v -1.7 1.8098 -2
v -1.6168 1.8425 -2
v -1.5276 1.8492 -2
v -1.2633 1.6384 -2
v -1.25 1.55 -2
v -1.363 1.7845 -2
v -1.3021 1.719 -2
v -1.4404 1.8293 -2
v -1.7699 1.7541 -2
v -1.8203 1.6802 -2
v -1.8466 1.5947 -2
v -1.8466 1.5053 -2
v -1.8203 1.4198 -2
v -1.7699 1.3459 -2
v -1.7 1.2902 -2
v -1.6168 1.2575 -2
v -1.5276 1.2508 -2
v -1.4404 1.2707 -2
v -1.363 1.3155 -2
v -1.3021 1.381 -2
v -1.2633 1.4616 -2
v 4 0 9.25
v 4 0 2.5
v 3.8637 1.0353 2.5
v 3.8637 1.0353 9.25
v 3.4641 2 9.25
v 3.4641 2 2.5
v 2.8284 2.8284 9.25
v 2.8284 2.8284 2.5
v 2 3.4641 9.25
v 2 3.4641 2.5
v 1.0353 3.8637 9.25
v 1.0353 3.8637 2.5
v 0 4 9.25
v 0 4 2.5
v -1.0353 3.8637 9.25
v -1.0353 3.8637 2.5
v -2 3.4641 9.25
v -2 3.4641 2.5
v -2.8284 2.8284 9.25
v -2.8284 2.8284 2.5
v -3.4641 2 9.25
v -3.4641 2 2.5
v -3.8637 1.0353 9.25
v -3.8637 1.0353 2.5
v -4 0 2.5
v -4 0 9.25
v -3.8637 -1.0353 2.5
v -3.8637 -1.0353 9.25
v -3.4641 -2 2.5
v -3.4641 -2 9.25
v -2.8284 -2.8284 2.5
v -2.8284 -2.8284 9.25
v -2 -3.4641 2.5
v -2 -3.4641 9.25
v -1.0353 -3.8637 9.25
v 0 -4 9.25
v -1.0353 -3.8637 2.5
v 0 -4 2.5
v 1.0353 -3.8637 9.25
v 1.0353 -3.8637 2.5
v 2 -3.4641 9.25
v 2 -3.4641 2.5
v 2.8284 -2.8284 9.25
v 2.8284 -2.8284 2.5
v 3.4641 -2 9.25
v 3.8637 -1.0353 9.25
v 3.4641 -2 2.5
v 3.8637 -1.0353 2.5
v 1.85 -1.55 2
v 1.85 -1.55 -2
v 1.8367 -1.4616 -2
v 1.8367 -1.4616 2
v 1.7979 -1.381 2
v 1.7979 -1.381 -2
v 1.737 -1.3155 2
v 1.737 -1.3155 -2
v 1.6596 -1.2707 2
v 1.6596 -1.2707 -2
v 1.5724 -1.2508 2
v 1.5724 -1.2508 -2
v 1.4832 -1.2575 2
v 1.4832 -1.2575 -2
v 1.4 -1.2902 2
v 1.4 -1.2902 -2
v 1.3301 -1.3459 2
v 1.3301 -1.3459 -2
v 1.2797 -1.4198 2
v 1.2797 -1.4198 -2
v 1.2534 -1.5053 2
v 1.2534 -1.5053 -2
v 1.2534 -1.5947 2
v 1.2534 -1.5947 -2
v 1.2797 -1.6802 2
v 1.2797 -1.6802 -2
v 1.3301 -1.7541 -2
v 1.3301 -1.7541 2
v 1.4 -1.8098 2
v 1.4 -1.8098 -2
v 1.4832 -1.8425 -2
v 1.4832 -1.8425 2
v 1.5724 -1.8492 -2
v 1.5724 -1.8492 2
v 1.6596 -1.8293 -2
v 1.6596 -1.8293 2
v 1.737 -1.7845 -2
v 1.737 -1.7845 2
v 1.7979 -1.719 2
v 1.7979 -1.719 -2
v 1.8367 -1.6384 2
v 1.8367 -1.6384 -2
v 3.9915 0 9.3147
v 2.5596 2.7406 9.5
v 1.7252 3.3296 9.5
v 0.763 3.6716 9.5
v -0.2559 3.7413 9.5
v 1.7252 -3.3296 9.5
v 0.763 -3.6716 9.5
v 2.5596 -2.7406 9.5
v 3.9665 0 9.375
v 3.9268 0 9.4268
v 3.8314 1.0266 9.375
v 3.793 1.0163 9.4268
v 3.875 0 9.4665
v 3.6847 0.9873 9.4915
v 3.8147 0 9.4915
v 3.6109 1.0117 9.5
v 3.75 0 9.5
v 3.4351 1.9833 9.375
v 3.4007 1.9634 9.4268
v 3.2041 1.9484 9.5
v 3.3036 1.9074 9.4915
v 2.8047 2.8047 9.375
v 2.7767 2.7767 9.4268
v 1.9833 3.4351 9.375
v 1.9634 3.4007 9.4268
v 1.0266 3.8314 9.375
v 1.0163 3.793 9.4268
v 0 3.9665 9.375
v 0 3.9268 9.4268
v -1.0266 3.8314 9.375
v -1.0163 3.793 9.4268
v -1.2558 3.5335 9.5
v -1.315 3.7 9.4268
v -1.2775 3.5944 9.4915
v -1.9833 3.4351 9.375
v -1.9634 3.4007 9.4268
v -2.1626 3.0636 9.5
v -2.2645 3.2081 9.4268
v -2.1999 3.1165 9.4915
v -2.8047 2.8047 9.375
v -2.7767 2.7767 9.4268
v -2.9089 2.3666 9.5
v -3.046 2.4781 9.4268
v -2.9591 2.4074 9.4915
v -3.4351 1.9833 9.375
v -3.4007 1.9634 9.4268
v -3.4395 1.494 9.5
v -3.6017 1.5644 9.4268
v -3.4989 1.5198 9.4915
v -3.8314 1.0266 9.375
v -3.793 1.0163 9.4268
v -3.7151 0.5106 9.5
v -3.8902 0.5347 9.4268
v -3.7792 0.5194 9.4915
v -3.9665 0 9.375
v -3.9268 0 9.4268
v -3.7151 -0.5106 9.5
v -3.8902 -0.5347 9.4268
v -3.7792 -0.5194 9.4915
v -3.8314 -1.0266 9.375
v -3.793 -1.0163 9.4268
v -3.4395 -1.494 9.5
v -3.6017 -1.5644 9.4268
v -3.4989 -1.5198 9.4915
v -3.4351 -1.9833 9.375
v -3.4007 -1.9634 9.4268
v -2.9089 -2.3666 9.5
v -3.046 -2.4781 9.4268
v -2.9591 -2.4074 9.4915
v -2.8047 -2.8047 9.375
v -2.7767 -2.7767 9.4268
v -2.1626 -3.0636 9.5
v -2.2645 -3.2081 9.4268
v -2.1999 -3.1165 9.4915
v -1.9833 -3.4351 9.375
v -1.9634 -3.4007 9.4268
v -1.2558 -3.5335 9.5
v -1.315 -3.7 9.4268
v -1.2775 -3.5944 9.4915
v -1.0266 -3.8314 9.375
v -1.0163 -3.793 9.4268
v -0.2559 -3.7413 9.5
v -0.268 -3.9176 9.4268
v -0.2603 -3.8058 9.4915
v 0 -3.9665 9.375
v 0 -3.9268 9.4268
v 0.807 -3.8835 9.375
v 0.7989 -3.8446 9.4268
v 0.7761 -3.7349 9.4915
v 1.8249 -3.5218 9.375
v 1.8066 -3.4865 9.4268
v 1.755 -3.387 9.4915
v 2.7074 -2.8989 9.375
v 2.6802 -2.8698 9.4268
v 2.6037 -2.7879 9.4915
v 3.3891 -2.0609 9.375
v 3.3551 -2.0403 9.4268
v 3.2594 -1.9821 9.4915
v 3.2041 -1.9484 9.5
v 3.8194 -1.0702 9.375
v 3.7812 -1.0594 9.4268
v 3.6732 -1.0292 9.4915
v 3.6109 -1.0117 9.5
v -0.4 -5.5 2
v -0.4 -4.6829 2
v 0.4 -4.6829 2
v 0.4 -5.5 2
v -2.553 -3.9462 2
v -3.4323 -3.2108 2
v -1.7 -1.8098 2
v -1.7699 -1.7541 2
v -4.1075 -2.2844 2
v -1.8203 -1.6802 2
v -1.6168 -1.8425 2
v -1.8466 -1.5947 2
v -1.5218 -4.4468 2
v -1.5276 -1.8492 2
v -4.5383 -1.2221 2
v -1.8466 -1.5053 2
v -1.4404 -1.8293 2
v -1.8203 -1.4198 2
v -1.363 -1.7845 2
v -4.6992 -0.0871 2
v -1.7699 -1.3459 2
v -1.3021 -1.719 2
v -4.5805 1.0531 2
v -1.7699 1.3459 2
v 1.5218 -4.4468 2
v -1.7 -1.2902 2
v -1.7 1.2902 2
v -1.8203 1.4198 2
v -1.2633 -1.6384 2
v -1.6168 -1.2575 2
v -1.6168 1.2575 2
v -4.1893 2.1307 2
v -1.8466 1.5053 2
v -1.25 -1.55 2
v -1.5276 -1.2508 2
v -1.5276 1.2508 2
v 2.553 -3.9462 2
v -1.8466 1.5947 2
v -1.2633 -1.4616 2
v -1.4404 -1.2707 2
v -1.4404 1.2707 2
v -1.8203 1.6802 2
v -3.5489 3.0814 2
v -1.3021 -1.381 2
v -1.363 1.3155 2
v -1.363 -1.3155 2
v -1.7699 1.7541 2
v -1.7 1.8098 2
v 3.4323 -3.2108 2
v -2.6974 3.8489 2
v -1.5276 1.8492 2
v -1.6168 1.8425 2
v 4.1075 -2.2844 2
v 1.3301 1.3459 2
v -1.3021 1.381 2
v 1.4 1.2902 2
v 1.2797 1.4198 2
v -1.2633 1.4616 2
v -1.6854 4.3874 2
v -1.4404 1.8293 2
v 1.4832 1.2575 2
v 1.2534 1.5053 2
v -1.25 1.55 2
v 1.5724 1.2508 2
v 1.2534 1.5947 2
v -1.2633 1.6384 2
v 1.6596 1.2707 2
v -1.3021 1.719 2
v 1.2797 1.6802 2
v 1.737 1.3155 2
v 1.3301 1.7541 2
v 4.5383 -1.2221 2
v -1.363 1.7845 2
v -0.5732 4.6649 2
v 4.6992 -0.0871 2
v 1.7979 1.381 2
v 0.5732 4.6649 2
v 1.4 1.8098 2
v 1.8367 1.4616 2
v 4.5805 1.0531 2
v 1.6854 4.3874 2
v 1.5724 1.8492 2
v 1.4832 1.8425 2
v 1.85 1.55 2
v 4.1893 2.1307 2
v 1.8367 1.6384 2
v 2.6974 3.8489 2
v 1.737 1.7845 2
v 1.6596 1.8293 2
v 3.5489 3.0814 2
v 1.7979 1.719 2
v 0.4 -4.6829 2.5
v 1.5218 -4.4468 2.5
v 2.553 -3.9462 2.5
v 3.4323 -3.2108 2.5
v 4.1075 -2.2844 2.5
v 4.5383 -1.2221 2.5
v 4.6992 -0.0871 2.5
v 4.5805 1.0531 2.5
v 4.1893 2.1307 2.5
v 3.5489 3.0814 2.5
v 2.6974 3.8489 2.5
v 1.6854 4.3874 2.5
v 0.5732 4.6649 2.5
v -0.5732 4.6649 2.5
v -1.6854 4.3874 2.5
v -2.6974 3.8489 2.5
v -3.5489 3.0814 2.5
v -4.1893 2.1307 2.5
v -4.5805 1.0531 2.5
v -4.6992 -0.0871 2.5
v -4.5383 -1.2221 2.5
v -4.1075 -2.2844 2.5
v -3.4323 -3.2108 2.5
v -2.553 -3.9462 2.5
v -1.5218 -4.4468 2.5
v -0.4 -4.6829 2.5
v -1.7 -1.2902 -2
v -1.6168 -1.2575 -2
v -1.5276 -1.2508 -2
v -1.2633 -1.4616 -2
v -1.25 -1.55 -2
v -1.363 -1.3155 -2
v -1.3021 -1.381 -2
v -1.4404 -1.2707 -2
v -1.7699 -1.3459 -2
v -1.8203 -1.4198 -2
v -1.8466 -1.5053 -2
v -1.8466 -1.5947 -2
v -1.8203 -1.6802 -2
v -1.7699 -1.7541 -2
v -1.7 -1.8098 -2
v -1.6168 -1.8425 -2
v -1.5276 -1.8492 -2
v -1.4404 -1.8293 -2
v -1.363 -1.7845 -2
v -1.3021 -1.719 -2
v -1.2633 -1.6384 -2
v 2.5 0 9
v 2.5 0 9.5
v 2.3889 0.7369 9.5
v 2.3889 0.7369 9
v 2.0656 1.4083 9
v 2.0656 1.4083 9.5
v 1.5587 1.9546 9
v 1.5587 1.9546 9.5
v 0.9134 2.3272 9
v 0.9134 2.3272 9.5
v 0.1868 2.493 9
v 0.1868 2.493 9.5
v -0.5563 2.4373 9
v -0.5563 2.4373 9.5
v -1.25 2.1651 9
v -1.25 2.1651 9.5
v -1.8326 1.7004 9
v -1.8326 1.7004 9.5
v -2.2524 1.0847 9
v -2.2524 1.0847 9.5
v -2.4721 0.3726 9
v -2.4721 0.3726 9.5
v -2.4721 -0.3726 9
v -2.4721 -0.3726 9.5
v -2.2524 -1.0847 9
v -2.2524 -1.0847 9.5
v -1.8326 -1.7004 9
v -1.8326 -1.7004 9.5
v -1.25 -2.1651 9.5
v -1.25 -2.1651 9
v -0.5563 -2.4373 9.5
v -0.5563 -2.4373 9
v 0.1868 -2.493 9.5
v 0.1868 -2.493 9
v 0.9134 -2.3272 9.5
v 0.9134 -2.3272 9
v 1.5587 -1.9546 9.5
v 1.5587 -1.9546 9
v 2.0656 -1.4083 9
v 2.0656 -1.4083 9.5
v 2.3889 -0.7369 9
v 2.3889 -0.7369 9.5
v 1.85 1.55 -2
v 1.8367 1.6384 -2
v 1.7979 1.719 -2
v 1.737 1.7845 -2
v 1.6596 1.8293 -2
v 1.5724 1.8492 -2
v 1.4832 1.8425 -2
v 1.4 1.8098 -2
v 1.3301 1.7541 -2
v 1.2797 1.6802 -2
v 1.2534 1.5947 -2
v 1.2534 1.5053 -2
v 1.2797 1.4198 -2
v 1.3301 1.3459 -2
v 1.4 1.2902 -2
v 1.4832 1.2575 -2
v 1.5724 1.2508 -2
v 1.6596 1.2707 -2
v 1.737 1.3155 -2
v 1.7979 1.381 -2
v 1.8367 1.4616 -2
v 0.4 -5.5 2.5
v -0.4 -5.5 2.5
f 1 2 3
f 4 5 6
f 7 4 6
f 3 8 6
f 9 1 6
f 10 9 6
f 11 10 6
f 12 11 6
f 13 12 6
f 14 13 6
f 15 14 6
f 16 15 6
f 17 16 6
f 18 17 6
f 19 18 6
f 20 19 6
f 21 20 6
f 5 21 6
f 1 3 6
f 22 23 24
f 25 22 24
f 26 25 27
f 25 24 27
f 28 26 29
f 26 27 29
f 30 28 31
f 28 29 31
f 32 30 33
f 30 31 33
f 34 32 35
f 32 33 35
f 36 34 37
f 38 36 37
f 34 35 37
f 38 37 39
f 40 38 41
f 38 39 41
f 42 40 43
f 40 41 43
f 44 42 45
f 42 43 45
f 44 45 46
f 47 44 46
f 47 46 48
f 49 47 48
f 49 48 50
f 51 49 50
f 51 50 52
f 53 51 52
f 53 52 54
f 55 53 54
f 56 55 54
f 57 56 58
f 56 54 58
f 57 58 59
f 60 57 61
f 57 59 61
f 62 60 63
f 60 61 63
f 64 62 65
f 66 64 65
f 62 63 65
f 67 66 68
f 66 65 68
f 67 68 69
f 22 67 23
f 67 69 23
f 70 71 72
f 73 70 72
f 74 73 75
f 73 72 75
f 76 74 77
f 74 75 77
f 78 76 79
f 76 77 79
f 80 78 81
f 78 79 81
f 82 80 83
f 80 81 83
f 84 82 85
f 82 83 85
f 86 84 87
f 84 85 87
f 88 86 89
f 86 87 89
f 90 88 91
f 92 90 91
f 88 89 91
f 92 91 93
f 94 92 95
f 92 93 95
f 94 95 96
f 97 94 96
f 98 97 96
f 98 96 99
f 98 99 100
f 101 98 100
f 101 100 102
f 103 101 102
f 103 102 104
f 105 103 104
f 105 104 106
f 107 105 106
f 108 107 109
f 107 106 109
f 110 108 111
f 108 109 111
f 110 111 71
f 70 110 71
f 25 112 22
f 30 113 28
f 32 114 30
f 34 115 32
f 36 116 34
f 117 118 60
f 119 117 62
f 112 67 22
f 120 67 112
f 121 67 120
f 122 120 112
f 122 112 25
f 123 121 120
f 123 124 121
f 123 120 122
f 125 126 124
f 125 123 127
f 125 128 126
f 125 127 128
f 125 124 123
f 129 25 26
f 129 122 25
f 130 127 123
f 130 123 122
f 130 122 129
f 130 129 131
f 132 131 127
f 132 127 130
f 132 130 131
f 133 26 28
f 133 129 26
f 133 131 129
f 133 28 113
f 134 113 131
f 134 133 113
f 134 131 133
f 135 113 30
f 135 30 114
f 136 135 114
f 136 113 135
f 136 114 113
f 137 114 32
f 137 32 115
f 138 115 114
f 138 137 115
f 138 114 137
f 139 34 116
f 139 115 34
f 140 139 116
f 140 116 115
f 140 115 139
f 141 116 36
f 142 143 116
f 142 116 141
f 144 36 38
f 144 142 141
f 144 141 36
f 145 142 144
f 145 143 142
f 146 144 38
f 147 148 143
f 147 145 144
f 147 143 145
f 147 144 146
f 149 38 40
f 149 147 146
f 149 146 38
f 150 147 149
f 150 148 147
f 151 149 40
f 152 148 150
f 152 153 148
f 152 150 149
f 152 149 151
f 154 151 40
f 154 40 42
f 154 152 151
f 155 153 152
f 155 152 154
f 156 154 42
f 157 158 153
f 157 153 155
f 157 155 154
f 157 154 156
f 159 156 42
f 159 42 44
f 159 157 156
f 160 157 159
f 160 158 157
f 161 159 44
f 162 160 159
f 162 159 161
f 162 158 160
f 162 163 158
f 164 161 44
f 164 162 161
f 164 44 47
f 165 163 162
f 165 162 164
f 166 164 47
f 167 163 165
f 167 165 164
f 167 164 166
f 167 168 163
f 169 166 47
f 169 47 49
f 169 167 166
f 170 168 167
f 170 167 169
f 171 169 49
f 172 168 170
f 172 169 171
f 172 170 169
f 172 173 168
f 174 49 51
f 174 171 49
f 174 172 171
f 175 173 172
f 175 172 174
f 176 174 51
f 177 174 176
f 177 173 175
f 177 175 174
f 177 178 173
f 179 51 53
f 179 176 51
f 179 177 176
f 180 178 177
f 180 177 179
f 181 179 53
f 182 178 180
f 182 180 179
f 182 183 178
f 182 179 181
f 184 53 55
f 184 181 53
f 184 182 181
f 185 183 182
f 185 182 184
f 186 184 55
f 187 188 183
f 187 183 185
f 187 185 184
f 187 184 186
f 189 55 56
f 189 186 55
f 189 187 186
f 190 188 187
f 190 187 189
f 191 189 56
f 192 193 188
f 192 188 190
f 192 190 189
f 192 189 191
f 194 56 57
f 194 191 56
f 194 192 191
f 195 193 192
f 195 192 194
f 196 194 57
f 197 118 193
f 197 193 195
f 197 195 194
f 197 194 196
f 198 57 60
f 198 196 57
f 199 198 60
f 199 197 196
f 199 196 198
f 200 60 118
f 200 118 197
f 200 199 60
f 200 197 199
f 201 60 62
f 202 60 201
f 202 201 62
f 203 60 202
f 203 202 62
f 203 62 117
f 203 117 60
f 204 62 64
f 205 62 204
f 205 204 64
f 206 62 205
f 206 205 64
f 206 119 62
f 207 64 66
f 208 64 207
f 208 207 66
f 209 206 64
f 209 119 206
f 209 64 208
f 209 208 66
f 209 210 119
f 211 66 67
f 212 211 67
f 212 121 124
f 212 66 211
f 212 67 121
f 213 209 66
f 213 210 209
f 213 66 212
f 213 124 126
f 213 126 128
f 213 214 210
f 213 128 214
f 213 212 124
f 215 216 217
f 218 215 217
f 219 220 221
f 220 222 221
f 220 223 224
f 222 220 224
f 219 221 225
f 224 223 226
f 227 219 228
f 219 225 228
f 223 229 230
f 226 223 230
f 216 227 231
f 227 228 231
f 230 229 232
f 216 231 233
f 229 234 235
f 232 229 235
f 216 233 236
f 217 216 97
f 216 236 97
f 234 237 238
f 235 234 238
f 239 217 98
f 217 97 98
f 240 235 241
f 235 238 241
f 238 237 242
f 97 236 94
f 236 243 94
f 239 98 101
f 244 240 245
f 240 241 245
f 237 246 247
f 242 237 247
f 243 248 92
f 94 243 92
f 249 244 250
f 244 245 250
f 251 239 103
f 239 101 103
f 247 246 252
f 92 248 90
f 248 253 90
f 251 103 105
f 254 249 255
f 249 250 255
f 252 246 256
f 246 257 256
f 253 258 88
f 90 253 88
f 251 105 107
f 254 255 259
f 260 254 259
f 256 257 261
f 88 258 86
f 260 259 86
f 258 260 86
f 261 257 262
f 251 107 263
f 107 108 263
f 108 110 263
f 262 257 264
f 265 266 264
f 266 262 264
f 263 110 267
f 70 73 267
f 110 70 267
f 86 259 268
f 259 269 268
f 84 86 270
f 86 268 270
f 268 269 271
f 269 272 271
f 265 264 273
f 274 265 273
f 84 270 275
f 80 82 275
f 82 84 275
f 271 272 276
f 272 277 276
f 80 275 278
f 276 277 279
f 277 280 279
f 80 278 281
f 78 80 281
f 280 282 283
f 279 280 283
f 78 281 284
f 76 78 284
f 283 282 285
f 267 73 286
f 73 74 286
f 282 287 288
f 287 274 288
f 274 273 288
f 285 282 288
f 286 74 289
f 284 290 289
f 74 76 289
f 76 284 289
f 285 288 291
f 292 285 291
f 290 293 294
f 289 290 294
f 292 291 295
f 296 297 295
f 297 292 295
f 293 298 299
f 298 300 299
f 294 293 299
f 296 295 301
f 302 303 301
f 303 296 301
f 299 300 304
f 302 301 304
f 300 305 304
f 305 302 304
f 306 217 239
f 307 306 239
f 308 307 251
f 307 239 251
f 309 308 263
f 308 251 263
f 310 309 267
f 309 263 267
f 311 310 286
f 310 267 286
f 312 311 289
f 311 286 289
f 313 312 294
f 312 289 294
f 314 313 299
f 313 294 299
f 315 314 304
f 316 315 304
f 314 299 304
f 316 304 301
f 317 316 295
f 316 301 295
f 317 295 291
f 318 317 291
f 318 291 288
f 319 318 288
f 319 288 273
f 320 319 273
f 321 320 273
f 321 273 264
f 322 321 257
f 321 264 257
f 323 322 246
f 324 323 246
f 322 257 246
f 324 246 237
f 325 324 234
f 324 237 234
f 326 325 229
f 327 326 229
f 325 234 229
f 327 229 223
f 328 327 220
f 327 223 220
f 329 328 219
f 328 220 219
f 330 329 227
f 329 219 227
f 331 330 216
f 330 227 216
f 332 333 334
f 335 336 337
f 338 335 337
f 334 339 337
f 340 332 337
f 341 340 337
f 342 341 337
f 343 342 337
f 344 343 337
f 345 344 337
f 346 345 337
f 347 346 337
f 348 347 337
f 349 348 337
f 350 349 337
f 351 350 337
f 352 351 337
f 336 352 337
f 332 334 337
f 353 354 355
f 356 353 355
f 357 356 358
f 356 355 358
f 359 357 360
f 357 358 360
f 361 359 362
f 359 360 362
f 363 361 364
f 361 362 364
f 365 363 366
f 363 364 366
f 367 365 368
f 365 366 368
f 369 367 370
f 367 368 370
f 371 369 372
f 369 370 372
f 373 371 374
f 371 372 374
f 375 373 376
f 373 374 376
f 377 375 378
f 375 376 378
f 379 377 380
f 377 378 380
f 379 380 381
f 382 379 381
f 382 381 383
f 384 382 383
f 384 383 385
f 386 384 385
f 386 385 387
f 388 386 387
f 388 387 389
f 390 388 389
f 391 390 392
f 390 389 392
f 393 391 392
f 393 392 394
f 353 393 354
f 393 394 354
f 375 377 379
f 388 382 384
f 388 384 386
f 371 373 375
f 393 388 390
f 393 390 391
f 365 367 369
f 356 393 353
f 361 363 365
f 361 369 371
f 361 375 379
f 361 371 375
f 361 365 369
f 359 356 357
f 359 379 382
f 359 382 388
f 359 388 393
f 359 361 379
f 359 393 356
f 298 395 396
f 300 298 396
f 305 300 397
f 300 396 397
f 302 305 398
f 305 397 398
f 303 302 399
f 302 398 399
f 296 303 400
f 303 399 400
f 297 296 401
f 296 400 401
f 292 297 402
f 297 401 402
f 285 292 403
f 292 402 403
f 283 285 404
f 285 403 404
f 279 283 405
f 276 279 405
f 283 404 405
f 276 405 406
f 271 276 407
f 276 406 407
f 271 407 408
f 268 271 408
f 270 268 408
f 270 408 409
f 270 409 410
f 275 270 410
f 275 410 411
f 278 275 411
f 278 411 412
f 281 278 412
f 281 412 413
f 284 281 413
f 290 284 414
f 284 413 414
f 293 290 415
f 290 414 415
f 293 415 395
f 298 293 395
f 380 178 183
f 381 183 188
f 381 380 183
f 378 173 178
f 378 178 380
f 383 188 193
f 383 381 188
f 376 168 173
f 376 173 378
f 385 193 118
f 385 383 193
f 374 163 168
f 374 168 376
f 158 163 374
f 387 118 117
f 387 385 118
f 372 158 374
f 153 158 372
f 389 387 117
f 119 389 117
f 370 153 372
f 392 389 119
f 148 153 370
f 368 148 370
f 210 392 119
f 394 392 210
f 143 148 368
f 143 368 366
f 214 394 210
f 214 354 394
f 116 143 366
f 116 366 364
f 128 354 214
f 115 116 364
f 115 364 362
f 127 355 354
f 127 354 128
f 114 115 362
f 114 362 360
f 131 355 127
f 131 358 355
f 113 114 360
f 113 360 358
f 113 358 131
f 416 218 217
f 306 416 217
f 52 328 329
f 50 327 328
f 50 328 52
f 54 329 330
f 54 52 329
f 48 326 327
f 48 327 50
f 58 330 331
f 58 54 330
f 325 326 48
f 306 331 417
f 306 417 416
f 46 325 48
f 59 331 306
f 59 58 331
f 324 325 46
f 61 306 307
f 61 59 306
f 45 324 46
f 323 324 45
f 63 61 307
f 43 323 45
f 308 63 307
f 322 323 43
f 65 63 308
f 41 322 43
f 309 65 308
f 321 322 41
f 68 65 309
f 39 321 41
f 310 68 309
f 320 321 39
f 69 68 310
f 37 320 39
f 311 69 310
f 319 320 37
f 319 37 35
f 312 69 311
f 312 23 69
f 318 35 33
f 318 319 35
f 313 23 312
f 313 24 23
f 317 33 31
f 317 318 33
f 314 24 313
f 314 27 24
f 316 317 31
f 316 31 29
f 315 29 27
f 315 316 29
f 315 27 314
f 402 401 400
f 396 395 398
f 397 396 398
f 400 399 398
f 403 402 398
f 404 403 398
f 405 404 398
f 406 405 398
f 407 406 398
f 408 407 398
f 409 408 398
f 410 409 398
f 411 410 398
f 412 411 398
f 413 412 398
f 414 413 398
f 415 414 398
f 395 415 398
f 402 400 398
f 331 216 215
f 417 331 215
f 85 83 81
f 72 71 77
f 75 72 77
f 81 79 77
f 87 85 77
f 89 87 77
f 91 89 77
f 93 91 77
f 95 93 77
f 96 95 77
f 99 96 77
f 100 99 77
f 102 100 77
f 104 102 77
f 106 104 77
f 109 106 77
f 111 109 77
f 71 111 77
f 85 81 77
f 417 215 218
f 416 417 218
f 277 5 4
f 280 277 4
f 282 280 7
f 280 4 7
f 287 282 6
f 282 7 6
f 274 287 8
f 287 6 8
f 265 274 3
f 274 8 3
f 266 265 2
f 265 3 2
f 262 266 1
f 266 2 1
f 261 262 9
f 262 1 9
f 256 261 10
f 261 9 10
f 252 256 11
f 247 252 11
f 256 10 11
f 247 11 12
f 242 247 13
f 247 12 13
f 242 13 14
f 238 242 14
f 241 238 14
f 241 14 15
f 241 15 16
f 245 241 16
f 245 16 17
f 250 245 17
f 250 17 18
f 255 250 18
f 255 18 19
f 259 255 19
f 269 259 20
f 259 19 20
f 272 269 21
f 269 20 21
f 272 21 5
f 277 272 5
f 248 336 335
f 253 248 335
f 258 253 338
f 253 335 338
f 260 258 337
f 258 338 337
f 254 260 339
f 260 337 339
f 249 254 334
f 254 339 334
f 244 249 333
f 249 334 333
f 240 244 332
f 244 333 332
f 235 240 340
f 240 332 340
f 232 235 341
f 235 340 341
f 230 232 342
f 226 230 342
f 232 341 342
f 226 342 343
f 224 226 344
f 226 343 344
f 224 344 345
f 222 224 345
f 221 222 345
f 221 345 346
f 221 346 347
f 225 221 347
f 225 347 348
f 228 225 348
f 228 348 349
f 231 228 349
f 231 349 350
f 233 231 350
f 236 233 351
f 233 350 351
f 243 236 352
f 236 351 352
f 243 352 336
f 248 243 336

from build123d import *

# Parameters (mm, degrees)
BOSS_EXTRUDE1_DEPTH        = 2
BOSS_EXTRUDE1_DEPTH_BACK   = 2
SKETCH1_R                  = 0.3
BOSS_EXTRUDE1_2_DEPTH      = 2
BOSS_EXTRUDE1_2_DEPTH_BACK = 2
BOSS_EXTRUDE1_3_DEPTH      = 2
BOSS_EXTRUDE1_3_DEPTH_BACK = 2
BOSS_EXTRUDE1_4_DEPTH      = 2
BOSS_EXTRUDE1_4_DEPTH_BACK = 2
BOSS_EXTRUDE2_DEPTH        = 0.5
SKETCH3_R                  = 4
BOSS_EXTRUDE3_DEPTH        = 7
FILLET1_R                  = 0.25
SKETCH4_R                  = 2.5
CUT_EXTRUDE1_DEPTH         = 0.5


with BuildPart() as part:
    # Sketch1 → Boss-Extrude1 (new, two sides: drawn at the far end of the back side and taken through both)
    with BuildSketch(Plane.XY.offset(-BOSS_EXTRUDE1_DEPTH_BACK)):
        with Locations((-1.55, 1.55)):
            Circle(SKETCH1_R)
    extrude(amount=BOSS_EXTRUDE1_DEPTH + BOSS_EXTRUDE1_DEPTH_BACK)



with BuildPart() as body_2:
    # Sketch1 → Boss-Extrude1 2 (new, two sides: drawn at the far end of the back side and taken through both)
    with BuildSketch(Plane.XY.offset(-BOSS_EXTRUDE1_2_DEPTH_BACK)):
        with Locations((-1.55, -1.55)):
            Circle(SKETCH1_R)
    extrude(amount=BOSS_EXTRUDE1_2_DEPTH + BOSS_EXTRUDE1_2_DEPTH_BACK)


with BuildPart() as body_3:
    # Sketch1 → Boss-Extrude1 3 (new, two sides: drawn at the far end of the back side and taken through both)
    with BuildSketch(Plane.XY.offset(-BOSS_EXTRUDE1_3_DEPTH_BACK)):
        with Locations((1.55, 1.55)):
            Circle(SKETCH1_R)
    extrude(amount=BOSS_EXTRUDE1_3_DEPTH + BOSS_EXTRUDE1_3_DEPTH_BACK)


with BuildPart() as body_4:
    # Sketch1 → Boss-Extrude1 4 (new, two sides: drawn at the far end of the back side and taken through both)
    with BuildSketch(Plane.XY.offset(-BOSS_EXTRUDE1_4_DEPTH_BACK)):
        with Locations((1.55, -1.55)):
            Circle(SKETCH1_R)
    extrude(amount=BOSS_EXTRUDE1_4_DEPTH + BOSS_EXTRUDE1_4_DEPTH_BACK)


with BuildPart() as part_1:
    add(part.part)

    add(body_2.part)  # Boss-Extrude2 merges body 2

    add(body_3.part)  # Boss-Extrude2 merges body 3

    add(body_4.part)  # Boss-Extrude2 merges body 4
    # Sketch2 → Boss-Extrude2 (add)
    with BuildSketch(Plane.XY.offset(2)):
        with BuildLine():
            Line((0, -5.5), (0.4, -5.5))
            Line((0.4, -5.5), (0.4, -4.68294779))
            ThreePointArc((0.4, -4.68294779), (0, 4.7), (-0.4, -4.68294779))
            Line((-0.4, -4.68294779), (-0.4, -5.5))
            Line((-0.4, -5.5), (0, -5.5))
        make_face()
    extrude(amount=BOSS_EXTRUDE2_DEPTH)

    # Sketch3 → Boss-Extrude3 (add)
    with BuildSketch(Plane.XY.offset(2.5)):
        Circle(SKETCH3_R)
    extrude(amount=BOSS_EXTRUDE3_DEPTH)

    # Fillet1
    fillet1_edges = [part_1.edges().sort_by_distance(p)[0] for p in [
        (-4, 0, 9.5),
    ]]
    fillet(fillet1_edges, radius=FILLET1_R)

    # Sketch4 → Cut-Extrude1 (cut)
    with BuildSketch(Plane.XY.offset(9.5)):
        Circle(SKETCH4_R)
    extrude(amount=-CUT_EXTRUDE1_DEPTH, mode=Mode.SUBTRACT)


solid = part_1.part
